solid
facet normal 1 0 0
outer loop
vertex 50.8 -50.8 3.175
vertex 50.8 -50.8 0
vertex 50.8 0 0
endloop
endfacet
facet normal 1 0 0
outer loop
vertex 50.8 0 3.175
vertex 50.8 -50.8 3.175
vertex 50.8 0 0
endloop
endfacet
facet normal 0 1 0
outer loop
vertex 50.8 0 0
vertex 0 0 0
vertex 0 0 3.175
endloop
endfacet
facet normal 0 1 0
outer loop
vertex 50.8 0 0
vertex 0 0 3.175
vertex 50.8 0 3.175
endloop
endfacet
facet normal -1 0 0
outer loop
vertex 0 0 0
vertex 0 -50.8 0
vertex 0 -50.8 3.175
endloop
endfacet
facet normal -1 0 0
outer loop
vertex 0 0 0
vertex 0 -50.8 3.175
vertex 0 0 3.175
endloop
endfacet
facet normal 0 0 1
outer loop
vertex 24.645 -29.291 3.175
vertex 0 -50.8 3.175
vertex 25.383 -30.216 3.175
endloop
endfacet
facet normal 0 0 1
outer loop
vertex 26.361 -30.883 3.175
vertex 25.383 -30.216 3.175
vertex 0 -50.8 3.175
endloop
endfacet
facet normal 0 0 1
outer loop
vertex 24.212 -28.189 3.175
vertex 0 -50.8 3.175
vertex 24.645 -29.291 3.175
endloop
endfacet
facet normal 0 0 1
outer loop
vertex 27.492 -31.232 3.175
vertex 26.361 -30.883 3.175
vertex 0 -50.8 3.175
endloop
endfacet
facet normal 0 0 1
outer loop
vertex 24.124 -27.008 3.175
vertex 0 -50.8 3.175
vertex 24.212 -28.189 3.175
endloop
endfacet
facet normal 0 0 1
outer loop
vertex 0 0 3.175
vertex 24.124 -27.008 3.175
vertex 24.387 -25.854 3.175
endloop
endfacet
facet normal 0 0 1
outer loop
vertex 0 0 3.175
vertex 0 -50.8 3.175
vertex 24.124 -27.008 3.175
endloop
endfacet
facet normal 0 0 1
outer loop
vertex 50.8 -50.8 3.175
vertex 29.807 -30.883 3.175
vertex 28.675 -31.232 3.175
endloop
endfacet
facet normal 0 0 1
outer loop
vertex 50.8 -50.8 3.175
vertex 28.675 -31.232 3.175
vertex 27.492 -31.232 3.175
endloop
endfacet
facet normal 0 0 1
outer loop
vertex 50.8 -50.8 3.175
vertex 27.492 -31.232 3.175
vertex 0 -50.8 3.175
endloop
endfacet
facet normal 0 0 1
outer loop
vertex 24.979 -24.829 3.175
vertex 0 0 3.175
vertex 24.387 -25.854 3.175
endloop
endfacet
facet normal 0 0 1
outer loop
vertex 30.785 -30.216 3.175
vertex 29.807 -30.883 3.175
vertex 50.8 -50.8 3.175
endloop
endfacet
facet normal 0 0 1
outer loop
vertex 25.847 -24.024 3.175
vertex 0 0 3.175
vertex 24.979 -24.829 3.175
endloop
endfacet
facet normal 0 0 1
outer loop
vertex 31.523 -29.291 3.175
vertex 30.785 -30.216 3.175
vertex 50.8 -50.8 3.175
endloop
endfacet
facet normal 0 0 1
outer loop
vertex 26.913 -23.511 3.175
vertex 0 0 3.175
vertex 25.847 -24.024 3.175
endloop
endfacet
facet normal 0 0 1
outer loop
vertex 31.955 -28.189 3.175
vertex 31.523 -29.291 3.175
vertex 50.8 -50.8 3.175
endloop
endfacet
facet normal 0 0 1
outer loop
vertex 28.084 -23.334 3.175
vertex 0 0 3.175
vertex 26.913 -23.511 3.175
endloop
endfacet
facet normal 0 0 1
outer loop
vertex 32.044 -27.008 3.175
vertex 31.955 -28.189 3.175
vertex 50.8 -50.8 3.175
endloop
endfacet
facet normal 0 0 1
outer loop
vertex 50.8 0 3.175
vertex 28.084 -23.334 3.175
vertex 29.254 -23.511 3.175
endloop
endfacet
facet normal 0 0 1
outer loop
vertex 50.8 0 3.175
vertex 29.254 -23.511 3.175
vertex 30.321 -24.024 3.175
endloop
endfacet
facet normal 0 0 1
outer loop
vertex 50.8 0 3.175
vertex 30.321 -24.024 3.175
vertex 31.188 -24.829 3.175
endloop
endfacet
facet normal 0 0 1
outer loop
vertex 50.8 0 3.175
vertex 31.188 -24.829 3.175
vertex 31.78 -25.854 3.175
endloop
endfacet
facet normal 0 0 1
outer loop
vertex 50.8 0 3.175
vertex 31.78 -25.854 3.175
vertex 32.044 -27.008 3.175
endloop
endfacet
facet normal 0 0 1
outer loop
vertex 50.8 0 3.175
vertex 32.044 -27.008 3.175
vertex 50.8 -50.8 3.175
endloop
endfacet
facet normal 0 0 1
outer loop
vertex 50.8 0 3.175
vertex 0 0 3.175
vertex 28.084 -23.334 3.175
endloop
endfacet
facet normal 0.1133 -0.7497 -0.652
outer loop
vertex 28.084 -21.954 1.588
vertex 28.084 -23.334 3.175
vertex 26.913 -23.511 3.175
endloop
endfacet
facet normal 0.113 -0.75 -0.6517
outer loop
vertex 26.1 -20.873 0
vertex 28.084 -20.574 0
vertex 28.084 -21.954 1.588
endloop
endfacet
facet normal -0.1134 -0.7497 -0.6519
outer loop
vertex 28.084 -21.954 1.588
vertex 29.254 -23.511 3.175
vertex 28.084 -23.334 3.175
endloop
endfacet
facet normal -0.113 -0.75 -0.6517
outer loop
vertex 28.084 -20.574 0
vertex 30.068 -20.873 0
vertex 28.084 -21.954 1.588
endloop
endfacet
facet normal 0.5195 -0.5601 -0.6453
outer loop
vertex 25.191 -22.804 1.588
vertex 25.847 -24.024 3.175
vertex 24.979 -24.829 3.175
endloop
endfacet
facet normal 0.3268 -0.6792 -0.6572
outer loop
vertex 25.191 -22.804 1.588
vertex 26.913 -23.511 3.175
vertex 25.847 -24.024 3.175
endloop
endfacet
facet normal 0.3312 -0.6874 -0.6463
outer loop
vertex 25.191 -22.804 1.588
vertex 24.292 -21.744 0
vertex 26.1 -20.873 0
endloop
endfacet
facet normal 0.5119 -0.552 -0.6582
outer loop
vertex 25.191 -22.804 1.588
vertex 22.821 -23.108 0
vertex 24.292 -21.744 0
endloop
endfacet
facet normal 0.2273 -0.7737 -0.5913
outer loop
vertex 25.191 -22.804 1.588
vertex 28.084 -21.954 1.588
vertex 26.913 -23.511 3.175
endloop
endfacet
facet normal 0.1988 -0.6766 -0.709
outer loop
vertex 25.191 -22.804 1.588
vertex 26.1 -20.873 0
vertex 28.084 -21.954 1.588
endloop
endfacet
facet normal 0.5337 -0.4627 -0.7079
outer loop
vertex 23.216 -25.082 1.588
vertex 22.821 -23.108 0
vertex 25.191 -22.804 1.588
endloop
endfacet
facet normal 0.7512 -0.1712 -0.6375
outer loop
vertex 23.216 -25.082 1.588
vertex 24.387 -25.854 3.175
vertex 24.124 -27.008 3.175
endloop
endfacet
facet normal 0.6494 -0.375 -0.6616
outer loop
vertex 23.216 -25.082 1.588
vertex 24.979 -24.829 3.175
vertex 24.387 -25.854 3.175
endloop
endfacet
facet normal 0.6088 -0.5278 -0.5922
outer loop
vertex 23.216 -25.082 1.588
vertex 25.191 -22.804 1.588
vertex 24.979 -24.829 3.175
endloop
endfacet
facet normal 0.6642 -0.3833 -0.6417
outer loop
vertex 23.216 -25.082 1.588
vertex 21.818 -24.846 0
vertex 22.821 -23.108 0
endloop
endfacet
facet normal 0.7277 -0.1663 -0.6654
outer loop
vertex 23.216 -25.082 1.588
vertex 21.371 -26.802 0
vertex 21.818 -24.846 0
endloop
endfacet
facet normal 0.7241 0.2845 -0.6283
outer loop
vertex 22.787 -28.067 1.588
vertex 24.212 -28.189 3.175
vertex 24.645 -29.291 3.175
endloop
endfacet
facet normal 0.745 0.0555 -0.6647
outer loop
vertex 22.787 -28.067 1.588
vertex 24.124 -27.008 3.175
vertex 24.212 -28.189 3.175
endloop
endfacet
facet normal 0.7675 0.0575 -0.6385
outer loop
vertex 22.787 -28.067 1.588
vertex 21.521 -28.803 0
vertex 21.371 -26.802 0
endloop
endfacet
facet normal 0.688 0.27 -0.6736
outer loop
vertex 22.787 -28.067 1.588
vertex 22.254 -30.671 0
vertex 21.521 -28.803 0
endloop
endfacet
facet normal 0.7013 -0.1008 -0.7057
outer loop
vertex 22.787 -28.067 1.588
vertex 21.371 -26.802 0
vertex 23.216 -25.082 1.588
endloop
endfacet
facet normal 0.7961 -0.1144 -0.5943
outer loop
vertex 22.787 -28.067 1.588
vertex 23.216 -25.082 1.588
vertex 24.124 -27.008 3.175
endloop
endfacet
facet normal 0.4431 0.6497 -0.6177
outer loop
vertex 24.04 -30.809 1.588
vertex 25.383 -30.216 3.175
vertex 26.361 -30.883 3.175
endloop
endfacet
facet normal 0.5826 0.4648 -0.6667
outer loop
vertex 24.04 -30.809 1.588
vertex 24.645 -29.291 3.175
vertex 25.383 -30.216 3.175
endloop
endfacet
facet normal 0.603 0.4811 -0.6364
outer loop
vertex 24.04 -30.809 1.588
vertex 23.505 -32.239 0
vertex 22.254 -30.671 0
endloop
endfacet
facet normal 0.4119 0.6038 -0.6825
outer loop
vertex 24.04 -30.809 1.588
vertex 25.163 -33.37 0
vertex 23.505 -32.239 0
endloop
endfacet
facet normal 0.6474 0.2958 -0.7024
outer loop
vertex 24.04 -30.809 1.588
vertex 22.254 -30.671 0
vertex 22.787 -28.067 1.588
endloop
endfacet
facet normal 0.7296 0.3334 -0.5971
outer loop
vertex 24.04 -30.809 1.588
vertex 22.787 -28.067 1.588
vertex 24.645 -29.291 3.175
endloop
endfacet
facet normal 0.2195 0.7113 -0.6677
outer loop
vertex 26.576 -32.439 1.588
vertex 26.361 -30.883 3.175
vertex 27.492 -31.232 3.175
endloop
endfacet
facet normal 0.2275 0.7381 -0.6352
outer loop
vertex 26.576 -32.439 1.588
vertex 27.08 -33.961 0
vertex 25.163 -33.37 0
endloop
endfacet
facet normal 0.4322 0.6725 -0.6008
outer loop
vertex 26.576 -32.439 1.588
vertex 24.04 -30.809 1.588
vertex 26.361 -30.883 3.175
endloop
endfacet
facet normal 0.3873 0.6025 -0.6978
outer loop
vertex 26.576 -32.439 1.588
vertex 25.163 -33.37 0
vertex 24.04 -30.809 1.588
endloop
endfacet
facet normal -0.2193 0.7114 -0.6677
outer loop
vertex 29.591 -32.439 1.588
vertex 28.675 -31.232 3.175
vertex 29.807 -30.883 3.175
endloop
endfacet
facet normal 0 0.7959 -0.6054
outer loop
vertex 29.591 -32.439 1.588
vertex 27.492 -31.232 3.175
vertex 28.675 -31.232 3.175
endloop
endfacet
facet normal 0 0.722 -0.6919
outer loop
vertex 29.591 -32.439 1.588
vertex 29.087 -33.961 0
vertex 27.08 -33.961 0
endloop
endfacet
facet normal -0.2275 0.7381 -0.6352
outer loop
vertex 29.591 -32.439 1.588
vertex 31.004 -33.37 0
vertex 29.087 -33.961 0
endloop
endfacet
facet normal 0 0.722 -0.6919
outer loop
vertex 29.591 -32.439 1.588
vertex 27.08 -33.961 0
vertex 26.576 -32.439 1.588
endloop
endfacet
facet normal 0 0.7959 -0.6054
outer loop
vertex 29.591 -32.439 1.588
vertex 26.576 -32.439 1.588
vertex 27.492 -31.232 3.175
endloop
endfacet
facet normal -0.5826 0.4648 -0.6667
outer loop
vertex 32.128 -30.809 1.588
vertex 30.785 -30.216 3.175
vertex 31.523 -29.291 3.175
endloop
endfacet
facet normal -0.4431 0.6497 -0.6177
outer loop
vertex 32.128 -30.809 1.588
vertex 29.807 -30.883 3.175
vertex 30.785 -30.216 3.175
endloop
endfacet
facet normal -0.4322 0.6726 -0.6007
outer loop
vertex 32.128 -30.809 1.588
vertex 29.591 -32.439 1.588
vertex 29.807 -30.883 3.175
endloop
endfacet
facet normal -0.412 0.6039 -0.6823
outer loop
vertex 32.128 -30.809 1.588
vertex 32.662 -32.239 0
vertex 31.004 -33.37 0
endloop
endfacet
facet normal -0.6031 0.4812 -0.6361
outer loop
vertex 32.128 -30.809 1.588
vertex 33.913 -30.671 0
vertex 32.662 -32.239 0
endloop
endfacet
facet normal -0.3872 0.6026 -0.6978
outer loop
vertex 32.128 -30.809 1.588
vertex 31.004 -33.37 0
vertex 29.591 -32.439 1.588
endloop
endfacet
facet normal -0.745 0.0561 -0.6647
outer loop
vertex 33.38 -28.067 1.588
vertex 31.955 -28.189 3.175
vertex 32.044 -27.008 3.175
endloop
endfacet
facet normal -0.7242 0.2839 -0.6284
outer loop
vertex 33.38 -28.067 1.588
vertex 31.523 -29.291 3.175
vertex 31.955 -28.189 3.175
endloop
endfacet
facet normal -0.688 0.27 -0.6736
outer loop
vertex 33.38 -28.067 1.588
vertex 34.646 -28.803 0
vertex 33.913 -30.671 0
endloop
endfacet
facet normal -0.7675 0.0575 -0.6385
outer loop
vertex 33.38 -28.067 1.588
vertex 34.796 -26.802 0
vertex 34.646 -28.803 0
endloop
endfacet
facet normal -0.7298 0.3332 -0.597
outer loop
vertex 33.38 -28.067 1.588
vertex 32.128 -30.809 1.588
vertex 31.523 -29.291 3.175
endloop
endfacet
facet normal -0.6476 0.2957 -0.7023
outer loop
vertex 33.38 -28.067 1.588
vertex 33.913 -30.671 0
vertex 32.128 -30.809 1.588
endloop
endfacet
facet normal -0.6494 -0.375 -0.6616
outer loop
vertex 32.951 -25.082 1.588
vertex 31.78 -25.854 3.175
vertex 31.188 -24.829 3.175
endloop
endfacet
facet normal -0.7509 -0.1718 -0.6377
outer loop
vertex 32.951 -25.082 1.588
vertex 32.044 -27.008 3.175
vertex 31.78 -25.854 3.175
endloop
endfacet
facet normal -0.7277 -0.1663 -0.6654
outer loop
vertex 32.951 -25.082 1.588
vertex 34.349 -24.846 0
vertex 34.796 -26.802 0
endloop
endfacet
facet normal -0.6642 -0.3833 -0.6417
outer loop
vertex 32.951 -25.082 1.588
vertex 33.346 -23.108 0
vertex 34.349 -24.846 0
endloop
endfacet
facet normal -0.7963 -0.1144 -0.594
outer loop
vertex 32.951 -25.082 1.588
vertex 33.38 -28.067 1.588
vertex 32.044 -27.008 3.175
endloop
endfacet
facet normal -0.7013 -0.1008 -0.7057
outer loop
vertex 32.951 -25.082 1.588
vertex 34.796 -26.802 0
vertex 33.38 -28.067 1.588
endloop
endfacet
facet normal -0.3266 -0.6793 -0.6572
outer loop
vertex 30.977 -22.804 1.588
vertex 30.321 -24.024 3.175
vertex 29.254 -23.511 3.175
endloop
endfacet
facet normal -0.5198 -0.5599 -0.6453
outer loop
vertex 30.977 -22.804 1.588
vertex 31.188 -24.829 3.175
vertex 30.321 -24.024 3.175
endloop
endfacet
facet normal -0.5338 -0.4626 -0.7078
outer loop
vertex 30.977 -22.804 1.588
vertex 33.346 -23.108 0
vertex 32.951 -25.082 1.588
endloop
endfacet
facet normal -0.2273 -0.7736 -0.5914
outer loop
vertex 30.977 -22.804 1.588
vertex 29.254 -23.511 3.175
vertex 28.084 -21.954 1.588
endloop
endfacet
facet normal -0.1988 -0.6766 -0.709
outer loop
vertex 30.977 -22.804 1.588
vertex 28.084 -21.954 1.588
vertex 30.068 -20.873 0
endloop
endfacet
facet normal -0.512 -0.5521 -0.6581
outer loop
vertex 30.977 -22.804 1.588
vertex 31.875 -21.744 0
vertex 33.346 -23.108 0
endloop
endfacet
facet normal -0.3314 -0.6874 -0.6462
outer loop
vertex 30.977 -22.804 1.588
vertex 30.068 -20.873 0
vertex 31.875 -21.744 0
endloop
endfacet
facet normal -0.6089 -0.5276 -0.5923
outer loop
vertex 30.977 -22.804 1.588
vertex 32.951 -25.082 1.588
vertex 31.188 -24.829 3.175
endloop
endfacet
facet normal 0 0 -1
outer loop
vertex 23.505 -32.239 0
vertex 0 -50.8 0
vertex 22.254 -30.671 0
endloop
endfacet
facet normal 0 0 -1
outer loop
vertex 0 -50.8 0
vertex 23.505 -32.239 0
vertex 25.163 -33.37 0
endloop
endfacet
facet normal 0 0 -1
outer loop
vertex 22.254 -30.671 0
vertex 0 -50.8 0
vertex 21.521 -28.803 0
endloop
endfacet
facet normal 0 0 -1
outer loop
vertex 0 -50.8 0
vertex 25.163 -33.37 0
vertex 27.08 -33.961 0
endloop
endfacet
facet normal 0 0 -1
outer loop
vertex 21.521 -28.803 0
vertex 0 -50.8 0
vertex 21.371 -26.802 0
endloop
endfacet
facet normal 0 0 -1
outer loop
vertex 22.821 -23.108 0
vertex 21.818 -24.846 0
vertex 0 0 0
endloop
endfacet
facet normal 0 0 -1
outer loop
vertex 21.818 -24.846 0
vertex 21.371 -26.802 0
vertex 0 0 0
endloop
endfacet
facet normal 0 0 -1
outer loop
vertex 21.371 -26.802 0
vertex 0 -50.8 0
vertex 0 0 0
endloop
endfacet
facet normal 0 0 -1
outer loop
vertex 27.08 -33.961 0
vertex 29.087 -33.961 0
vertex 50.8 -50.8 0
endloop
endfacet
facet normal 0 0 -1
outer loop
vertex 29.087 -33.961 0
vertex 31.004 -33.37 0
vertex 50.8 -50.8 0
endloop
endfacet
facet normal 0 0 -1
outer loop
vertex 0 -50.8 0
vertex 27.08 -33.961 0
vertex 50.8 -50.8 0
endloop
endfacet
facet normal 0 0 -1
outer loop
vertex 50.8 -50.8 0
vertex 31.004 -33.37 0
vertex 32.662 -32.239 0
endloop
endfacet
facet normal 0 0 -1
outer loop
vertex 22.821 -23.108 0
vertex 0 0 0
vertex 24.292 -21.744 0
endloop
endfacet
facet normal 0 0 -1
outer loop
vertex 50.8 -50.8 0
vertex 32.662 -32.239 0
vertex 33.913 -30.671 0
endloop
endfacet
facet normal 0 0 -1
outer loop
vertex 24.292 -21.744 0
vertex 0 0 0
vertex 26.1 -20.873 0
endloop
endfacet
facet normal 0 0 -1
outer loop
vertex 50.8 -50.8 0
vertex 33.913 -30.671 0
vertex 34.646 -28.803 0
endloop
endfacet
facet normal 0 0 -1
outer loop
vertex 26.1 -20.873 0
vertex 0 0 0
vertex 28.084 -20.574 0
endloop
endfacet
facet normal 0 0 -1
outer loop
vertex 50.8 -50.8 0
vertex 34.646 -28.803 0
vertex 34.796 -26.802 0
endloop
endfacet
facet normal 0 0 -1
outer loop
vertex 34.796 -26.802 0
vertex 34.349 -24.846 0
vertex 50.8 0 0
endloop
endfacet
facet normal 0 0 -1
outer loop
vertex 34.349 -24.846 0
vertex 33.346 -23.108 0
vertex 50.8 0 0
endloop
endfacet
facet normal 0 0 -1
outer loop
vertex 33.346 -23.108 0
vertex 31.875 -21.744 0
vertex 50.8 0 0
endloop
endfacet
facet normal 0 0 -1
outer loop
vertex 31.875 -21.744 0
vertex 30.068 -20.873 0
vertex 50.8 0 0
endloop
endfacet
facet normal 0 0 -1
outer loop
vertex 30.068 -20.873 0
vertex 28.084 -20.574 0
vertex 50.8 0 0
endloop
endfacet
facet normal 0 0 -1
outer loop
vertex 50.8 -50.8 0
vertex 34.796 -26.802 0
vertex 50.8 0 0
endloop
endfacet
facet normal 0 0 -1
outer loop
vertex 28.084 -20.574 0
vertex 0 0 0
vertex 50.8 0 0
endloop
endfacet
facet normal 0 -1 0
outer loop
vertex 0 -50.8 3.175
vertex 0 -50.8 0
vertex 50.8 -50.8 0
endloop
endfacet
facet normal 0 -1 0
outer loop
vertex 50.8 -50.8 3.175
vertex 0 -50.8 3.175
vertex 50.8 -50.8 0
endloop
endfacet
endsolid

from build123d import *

# Parameters (mm, degrees)
SKETCH1_W           = 50.8
SKETCH1_H           = 50.8
BOSS_EXTRUDE2_DEPTH = 3.175


with BuildPart() as part:
    # Sketch1 → Boss-Extrude2 (new body)
    with BuildSketch(Plane.XY):
        with Locations((25.4, -25.4)):
            Rectangle(SKETCH1_W, SKETCH1_H)
    extrude(amount=BOSS_EXTRUDE2_DEPTH)

    # Sketch2 → 1/4 (0.25) Diameter Hole1 (revolve, cut)
    with BuildSketch(Plane(origin=(28.083631343, -27.305207035, 0), x_dir=(0, 1, 0), z_dir=(1, 0, 0))):
        Polygon((0, 0), (0, 3.175), (3.175, 3.175), (3.175, 4.090710056), (6.731, 0), align=None)
    revolve(axis=Axis((28.083631343, -27.305207035, -6.35), (0, 0, 1)), mode=Mode.SUBTRACT)


solid = part.part
